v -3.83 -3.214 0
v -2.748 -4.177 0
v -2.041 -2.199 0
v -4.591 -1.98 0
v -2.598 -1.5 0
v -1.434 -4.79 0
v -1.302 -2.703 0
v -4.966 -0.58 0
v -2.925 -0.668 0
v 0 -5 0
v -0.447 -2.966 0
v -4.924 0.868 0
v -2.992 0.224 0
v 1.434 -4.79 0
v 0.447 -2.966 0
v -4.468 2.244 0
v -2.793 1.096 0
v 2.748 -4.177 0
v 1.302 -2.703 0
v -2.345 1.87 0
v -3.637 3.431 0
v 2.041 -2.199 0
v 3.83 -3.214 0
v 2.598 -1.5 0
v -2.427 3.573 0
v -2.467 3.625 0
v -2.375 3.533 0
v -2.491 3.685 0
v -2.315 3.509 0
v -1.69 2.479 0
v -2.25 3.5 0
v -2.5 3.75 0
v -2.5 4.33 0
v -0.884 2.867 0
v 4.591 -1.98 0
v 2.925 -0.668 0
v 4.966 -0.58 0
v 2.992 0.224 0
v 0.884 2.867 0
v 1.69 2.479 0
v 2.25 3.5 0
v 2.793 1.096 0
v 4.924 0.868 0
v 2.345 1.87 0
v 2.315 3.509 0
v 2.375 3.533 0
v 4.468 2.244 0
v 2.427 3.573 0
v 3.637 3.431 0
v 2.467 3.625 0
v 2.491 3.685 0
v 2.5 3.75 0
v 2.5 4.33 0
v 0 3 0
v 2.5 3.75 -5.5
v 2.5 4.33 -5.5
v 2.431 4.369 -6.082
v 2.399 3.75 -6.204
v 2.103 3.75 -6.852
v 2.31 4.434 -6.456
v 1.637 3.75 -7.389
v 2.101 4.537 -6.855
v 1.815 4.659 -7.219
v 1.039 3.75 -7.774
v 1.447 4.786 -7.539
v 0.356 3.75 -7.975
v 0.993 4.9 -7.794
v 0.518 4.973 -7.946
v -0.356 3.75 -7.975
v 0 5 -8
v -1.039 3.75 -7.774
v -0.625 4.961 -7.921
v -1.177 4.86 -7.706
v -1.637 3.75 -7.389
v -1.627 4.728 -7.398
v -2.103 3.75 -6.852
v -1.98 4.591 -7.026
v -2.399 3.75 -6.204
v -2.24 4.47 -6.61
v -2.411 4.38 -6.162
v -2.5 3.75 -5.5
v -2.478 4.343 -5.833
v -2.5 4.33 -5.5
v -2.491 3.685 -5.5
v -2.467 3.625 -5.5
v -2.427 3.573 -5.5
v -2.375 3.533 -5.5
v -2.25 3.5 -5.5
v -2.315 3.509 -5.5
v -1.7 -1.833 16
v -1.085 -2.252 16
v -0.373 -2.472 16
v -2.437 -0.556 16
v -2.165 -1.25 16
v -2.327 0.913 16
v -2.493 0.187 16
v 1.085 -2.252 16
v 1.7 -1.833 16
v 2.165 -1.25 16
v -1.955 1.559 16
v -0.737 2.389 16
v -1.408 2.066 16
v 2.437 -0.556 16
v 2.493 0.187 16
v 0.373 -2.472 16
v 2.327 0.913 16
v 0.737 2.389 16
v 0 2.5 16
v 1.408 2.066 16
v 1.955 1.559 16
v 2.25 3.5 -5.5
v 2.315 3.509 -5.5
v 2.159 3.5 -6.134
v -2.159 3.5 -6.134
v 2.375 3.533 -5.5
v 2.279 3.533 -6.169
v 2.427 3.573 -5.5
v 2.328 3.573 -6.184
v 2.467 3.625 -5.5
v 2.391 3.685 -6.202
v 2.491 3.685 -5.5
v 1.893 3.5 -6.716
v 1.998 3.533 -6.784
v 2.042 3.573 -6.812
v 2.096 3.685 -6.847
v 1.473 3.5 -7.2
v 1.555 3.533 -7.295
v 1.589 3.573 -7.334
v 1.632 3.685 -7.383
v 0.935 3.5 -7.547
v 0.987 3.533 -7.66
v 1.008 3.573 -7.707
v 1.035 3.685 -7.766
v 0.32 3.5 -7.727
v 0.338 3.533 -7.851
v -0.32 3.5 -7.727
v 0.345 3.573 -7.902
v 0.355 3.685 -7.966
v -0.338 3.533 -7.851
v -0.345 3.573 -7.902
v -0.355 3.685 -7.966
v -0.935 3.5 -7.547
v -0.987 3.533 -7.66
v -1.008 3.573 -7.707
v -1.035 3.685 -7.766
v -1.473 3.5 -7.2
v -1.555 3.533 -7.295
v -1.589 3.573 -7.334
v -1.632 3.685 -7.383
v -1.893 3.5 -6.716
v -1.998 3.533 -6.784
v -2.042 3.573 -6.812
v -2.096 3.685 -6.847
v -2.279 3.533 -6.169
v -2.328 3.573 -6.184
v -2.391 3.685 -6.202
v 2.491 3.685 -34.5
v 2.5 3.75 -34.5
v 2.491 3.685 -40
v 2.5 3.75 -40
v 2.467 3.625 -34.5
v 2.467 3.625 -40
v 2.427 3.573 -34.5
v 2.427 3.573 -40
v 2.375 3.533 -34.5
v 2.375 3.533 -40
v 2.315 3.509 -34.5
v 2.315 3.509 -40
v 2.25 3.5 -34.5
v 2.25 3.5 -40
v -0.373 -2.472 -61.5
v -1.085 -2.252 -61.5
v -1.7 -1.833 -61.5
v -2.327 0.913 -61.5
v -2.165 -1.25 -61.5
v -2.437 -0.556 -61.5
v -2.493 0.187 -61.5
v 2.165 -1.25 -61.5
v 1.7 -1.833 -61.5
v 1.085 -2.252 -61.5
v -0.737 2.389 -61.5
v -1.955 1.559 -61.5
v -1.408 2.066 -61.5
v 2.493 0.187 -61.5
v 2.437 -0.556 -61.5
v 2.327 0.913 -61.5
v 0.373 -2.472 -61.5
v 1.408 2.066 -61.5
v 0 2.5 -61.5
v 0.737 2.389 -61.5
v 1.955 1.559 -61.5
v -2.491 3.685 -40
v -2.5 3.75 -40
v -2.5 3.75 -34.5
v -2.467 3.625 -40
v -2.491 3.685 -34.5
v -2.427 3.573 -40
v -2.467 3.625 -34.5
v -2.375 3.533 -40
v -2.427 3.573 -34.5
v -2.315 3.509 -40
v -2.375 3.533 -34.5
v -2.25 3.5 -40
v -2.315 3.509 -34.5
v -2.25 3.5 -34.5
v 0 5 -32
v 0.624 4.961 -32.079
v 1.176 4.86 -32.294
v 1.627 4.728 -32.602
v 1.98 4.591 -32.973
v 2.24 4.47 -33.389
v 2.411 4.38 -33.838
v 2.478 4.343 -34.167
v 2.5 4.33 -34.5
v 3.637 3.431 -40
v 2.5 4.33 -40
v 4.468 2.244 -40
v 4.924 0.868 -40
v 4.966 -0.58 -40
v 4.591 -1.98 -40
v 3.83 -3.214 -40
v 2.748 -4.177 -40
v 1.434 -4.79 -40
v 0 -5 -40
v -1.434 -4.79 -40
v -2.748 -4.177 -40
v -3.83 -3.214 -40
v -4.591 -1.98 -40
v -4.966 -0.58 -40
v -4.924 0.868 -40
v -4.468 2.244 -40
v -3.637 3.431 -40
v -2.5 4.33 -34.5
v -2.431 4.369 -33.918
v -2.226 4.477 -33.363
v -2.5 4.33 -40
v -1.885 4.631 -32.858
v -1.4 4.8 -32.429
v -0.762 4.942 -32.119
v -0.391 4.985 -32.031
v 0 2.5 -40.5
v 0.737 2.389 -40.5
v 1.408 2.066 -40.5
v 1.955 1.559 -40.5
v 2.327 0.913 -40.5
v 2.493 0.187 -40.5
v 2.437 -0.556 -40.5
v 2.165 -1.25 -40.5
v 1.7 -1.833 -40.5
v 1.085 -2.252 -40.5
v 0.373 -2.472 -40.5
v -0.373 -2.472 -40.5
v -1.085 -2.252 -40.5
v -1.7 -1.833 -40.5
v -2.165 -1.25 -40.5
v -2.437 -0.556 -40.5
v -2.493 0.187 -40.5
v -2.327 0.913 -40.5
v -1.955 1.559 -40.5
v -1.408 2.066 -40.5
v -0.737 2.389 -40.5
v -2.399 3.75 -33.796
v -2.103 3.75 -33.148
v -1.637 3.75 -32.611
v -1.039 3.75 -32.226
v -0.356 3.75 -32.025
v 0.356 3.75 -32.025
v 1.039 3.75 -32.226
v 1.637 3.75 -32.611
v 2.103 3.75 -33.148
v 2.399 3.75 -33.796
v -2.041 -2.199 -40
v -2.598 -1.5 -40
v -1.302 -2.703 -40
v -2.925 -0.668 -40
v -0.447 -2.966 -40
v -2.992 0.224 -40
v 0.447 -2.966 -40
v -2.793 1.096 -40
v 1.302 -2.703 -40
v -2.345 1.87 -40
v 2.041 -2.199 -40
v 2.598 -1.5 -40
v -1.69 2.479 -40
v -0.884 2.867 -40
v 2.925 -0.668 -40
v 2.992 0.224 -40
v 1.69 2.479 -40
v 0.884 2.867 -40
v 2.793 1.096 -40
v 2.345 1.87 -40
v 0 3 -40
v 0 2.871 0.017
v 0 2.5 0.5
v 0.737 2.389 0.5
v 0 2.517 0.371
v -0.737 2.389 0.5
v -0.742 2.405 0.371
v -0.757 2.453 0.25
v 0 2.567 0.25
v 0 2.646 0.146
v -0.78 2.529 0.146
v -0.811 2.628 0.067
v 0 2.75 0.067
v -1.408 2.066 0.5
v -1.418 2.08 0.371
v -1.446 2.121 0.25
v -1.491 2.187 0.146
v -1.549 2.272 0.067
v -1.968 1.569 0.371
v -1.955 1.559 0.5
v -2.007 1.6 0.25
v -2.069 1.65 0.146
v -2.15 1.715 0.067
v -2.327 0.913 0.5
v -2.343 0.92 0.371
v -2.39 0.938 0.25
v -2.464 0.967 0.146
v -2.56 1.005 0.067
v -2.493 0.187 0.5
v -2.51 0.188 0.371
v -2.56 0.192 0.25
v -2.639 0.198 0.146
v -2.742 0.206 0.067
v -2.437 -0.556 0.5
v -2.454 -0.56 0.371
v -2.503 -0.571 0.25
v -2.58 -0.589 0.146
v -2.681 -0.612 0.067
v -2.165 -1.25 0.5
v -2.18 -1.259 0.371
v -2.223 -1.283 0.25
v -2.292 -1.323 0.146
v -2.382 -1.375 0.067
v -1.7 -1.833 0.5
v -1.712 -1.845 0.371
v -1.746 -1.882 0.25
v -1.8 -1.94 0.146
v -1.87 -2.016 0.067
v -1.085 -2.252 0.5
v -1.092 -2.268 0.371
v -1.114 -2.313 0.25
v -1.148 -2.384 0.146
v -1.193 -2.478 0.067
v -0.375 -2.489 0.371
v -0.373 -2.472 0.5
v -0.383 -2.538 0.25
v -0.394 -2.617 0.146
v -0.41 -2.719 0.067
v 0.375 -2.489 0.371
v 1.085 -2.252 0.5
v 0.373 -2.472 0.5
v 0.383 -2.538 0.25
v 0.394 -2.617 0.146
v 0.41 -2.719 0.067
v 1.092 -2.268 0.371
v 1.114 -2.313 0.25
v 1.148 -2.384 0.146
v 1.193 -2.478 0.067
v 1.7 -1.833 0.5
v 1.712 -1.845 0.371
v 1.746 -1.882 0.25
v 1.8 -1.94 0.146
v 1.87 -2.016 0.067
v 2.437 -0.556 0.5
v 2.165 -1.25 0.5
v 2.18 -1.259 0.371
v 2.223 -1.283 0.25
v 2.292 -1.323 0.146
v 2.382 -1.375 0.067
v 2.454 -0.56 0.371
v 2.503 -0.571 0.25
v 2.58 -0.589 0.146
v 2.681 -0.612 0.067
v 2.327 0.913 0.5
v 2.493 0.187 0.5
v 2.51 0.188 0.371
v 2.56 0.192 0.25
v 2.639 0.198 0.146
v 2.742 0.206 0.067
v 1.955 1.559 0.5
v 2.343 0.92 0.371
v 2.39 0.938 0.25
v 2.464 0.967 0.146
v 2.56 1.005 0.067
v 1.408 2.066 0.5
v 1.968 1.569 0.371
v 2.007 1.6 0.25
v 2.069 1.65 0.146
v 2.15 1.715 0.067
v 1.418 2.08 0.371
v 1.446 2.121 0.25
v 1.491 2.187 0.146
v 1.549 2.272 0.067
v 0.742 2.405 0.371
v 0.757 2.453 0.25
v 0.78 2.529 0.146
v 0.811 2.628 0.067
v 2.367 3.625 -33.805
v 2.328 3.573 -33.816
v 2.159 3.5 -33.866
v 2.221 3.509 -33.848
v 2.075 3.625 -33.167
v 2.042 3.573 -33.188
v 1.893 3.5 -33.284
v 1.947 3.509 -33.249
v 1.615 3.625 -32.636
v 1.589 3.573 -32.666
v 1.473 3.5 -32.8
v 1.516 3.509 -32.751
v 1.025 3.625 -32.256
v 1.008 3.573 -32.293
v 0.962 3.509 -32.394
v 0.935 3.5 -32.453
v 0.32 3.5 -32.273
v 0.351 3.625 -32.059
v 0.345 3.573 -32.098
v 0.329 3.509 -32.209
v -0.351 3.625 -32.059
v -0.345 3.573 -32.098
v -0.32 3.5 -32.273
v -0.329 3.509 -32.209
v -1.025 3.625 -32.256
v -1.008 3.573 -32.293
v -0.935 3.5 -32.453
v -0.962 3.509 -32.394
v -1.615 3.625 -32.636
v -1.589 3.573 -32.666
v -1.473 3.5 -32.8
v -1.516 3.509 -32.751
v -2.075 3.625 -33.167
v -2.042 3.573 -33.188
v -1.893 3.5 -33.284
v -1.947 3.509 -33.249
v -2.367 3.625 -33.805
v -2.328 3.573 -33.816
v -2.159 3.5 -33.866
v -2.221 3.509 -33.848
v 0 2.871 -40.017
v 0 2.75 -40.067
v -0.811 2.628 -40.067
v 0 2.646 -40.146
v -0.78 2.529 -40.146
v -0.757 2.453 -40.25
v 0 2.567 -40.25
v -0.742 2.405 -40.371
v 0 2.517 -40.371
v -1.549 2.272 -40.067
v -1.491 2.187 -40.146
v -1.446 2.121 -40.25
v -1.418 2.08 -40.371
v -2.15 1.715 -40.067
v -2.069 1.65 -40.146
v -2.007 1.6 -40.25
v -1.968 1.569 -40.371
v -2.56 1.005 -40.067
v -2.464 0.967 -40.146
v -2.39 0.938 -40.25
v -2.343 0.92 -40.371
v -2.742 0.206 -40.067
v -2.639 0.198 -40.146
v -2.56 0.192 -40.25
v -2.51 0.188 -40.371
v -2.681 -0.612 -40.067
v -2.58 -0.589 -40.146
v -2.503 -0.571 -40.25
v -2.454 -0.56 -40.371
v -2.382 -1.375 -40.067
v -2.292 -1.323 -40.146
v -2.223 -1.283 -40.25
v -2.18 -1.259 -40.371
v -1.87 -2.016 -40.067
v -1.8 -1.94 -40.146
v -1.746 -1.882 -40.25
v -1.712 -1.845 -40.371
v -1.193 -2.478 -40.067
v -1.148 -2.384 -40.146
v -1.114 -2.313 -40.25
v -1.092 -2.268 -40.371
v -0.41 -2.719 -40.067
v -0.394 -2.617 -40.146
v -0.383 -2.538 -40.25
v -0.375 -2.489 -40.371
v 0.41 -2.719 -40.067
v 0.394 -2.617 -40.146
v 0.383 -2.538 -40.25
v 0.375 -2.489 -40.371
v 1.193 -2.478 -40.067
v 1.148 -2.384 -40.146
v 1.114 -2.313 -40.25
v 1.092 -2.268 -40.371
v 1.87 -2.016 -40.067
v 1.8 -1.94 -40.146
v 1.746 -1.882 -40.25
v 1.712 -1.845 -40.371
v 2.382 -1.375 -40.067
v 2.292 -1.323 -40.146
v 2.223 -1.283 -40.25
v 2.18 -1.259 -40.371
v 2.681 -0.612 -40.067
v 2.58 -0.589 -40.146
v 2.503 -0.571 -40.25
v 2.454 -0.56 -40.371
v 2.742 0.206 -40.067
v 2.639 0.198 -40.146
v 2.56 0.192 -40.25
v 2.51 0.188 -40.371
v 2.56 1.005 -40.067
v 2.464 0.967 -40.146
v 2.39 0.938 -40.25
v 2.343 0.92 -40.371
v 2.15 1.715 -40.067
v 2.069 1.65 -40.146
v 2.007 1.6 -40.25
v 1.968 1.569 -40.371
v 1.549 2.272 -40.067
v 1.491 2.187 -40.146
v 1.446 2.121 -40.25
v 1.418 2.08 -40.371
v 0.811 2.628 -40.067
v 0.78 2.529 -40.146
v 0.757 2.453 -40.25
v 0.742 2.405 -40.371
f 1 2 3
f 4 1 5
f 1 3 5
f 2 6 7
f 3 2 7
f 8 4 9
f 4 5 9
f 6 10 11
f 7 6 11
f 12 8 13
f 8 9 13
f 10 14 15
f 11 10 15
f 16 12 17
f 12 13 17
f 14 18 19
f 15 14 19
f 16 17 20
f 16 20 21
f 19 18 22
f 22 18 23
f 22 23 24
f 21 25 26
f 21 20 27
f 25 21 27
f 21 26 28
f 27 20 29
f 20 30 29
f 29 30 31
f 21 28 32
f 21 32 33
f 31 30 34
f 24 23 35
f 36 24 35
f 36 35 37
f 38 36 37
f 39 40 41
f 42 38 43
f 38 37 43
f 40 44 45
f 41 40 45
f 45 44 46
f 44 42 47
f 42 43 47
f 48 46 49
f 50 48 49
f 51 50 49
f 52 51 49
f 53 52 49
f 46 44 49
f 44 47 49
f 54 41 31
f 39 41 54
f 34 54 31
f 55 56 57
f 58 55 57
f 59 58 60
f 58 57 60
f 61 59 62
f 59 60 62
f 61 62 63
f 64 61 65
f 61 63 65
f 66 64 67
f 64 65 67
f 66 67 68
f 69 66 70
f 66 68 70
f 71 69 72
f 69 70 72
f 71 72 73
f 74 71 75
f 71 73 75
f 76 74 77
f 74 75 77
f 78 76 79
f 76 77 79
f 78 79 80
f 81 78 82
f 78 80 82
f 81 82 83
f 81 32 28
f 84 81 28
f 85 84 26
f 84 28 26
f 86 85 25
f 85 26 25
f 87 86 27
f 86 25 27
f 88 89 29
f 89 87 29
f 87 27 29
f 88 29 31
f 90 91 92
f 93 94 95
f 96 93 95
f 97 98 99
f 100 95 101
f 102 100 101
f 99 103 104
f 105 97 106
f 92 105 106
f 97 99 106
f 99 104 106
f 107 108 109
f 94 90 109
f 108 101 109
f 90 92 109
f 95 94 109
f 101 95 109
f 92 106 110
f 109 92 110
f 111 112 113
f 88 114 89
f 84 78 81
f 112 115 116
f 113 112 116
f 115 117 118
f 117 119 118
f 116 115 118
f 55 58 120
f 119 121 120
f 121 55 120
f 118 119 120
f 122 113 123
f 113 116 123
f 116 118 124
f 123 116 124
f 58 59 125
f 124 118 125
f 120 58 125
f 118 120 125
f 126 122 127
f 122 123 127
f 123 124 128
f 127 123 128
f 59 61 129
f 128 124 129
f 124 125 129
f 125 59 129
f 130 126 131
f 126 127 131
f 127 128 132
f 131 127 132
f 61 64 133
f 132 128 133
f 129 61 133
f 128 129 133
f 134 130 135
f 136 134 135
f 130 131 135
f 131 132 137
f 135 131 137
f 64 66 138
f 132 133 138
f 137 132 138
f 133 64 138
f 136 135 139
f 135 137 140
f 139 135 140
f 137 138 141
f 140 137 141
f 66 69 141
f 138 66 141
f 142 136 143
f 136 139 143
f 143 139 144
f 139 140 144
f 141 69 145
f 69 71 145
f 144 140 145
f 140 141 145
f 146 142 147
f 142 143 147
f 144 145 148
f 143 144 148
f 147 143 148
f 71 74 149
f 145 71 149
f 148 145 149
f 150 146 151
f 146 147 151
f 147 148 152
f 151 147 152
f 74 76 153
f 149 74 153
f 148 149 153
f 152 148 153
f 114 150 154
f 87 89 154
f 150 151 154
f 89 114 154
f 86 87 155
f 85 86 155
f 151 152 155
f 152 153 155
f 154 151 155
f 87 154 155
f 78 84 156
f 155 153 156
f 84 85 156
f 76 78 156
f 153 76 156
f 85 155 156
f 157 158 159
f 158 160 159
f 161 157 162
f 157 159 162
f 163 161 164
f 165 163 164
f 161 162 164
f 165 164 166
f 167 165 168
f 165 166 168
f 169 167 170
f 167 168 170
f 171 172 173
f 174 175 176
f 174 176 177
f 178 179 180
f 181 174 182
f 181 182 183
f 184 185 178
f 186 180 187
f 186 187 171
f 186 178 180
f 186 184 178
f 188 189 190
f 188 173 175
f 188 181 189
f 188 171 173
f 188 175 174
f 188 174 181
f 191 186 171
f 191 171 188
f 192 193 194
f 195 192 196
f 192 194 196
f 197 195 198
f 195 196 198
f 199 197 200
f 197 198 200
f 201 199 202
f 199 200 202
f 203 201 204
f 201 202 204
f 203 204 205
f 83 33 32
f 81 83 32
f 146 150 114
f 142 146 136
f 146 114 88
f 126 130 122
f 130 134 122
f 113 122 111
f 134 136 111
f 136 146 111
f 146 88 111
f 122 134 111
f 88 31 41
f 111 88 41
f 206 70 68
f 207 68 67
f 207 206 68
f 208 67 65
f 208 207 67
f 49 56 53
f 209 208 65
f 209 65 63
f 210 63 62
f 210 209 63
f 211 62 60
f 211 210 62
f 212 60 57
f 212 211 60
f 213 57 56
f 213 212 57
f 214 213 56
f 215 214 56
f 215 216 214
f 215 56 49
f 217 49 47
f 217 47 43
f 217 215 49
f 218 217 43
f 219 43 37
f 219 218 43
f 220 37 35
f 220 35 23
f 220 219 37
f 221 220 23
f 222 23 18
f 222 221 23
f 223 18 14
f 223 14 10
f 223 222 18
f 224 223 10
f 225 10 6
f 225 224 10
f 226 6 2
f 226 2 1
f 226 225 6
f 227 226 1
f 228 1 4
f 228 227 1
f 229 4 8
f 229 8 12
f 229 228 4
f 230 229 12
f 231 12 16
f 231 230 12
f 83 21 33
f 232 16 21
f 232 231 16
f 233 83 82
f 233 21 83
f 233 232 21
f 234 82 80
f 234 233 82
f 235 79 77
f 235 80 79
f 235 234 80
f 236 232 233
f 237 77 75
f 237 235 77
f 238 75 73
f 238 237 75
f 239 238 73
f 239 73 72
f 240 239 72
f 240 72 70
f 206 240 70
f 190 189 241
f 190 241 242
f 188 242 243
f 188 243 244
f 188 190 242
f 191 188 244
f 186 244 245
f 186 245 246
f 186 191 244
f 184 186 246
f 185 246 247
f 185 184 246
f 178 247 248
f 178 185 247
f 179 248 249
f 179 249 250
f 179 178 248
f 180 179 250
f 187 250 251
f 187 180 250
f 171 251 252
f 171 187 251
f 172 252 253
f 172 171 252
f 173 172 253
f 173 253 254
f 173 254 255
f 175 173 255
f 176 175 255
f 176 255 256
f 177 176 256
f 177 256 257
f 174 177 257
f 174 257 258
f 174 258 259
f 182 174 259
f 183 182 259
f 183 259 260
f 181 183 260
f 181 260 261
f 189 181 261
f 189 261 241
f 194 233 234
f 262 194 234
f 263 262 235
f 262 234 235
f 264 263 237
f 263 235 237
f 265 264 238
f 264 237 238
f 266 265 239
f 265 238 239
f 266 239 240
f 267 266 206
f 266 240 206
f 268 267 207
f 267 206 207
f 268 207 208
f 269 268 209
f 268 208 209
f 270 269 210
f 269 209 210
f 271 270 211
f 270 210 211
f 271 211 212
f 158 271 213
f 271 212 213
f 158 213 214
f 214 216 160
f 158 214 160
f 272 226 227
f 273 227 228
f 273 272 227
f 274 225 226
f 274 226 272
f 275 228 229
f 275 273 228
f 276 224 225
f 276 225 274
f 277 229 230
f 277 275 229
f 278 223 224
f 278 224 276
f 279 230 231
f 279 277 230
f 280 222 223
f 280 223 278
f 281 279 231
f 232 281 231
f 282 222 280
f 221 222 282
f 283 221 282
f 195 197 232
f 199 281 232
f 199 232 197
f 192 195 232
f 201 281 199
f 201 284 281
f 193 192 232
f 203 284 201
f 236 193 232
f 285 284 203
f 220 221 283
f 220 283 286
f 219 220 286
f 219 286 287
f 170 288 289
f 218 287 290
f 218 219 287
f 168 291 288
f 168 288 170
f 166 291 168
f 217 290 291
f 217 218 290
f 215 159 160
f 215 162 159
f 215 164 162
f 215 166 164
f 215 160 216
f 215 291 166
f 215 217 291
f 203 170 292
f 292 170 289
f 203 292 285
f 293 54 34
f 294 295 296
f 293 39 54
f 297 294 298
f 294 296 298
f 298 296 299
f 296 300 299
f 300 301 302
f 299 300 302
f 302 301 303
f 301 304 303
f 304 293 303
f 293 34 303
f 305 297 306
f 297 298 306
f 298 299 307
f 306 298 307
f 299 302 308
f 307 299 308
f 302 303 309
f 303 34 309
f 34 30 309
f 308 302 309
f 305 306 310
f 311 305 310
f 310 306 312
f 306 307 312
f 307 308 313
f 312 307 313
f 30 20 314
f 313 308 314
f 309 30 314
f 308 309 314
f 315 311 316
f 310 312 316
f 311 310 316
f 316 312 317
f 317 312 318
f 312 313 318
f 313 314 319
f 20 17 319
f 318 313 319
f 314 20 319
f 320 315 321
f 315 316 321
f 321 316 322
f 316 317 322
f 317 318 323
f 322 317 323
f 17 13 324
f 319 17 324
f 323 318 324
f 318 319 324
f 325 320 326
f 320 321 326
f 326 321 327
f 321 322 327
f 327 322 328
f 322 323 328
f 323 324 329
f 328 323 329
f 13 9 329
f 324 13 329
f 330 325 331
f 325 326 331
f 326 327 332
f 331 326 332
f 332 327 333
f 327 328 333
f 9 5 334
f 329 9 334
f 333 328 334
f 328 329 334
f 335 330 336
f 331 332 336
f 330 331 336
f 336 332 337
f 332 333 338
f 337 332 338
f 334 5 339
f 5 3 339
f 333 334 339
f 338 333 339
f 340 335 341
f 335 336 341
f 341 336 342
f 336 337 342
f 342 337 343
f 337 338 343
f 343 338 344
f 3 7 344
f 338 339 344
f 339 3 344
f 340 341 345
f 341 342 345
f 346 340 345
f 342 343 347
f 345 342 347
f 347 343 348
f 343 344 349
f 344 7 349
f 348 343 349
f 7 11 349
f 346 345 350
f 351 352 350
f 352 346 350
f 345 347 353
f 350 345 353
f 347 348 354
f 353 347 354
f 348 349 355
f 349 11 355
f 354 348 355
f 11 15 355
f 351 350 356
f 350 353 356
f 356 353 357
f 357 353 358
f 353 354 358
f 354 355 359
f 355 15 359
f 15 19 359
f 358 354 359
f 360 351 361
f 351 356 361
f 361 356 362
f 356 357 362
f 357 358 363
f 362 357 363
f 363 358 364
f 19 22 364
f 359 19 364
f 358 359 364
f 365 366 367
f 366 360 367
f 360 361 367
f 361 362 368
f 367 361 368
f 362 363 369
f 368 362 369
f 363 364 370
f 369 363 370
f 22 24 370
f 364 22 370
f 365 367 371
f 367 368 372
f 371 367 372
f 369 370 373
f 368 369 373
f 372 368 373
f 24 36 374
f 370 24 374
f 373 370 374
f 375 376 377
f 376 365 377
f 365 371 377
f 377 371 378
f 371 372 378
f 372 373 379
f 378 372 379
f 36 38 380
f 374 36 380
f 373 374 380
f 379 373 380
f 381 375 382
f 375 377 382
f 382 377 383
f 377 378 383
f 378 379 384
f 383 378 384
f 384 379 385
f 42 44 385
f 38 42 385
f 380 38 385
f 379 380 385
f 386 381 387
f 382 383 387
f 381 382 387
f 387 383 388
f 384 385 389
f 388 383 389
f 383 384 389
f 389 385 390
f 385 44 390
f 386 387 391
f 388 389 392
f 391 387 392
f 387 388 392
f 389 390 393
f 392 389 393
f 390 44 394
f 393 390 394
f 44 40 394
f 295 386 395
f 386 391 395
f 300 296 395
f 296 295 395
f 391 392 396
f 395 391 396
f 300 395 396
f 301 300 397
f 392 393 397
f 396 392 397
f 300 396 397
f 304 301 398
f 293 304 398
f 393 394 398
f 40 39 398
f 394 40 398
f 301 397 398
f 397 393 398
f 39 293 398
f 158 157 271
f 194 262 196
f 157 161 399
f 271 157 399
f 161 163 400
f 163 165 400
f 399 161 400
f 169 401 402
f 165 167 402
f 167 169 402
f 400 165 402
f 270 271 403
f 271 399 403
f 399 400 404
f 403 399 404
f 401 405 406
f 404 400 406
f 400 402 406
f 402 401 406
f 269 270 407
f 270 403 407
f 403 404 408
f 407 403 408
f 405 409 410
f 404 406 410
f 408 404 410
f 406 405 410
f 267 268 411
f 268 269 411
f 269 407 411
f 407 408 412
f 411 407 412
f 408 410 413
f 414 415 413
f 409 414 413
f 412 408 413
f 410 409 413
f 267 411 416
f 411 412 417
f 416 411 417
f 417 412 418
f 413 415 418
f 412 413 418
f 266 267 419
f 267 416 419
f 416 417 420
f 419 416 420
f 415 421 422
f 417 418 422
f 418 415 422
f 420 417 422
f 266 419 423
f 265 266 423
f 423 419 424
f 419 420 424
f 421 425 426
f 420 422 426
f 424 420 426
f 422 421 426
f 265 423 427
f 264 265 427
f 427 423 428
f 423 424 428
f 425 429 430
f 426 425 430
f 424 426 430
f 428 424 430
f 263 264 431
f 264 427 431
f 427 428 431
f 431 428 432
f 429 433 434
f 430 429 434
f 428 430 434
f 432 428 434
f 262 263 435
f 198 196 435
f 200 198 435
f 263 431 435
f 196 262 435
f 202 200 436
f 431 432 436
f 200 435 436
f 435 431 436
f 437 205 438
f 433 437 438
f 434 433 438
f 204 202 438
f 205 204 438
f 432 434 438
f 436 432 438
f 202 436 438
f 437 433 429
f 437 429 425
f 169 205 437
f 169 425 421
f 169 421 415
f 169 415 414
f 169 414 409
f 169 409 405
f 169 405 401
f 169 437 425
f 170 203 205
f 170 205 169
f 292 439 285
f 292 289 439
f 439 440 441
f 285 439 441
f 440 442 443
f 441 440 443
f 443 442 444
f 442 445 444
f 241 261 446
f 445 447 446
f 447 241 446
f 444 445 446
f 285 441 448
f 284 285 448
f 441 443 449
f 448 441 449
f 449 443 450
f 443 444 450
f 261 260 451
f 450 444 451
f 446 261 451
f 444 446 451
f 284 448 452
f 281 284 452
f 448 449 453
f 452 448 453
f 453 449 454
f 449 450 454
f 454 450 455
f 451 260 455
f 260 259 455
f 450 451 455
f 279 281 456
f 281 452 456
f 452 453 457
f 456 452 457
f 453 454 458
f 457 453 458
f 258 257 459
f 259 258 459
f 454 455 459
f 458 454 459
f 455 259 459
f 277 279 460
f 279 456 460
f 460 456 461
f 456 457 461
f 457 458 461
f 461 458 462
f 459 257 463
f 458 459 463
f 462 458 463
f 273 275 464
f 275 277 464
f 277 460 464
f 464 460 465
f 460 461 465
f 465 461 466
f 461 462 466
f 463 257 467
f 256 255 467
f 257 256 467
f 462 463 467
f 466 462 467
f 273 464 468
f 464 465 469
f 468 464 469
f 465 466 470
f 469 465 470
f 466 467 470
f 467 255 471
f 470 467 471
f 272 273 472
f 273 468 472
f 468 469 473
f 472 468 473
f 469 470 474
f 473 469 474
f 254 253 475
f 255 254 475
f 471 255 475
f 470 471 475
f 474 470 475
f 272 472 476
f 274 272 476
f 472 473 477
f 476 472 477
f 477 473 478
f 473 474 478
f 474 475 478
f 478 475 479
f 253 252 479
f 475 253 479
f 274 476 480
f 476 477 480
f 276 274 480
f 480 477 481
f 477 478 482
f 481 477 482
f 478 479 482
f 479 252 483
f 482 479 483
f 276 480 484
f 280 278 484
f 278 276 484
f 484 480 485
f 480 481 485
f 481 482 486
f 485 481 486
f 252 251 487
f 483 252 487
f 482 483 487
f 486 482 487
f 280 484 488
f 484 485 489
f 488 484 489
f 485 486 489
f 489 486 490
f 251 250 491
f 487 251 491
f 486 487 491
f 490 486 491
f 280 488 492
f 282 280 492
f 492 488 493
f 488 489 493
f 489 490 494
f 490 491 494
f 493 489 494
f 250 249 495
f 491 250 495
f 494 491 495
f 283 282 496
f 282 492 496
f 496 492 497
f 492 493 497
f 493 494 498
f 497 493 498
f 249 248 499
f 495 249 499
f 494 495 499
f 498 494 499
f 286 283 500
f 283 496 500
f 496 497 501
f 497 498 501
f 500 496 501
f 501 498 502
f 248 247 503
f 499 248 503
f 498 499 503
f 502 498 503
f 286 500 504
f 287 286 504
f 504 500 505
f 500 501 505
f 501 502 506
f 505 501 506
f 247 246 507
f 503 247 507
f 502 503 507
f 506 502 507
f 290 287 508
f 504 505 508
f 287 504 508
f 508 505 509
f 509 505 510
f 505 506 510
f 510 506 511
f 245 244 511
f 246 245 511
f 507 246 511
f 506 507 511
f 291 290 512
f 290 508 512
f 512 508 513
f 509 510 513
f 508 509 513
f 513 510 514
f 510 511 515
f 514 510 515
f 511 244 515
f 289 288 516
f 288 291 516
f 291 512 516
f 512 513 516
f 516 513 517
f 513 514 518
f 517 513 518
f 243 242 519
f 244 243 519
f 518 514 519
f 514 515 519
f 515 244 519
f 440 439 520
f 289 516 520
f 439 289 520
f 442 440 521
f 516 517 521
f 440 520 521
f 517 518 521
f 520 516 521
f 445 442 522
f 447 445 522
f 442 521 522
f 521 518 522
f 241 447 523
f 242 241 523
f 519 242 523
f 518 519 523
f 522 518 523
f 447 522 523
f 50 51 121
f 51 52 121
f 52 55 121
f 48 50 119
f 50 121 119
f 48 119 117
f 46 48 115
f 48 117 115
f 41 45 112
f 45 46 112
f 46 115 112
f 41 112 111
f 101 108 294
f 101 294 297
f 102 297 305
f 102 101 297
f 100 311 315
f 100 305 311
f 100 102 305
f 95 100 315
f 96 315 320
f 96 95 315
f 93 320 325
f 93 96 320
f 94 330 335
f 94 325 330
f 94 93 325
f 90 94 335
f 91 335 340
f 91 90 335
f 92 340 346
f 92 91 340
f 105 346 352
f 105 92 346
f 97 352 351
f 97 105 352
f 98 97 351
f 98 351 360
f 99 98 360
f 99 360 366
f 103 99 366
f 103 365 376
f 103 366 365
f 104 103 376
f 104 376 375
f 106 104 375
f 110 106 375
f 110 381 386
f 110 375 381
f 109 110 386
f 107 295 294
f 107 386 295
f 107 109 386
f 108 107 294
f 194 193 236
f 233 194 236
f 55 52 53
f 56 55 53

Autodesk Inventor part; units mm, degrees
ref_plane "YZ Plane" through (0, 0, 0) normal (1, 0, 0) x (0, 1, 0)
ref_plane "XZ Plane" through (0, 0, 0) normal (0, 1, 0) x (-1, 0, 0)
sketch "Sketch1" plane through (0, 0, 0) normal (1, 0, 0) x (0, 1, 0)
  line L0 (0, 0) -> (5, 0)
  line L1 (5, 0) -> (5, -40)
  line L2 (5, -40) -> (0, -40)
  line L3 (0, -40) -> (0, 0)
  line L4 (0, 0) -> (2.5, 0)
  line L5 (2.5, 0) -> (2.5, 16)
  line L6 (2.5, 16) -> (0, 16)
  line L7 (0, 16) -> (0, 0)
  line L8 (0, -40) -> (2.5, -40)
  line L9 (2.5, -40) -> (2.5, -54)
  line L10 (2.5, -54) -> (0, -54)
  line L11 (0, -54) -> (0, -40)
  line L12 (0, -54) -> (2.5, -54)
  line L13 (2.5, -54) -> (2.5, -61.5)
  line L14 (2.5, -61.5) -> (0, -61.5)
  line L15 (0, -61.5) -> (0, -54)
  line L16 (0, 16) -> (2, 16)
  line L17 (0, 14) -> (0, 16)
  line L18 (0, 19.99) -> (0, -68.5807)
  point P0 (2.5, -40)
  dimension "d0" = 5
  dimension "d1" = 40
  dimension "d2" = 2.5
  dimension "d3" = 16
  dimension "d4" = 2.5
  dimension "d5" = 14
  dimension "d6" = 2.5
  dimension "d7" = 7.5
revolve "Revolution1" add sketch "Sketch1" angle 360 about axis through (0, 0, 19.99) along (0, 0, -1)
sketch "Sketch4" plane through (0, 0, 0) normal (0, 0, 1) x (1, 0, 0)
  circle A0 centre (0, 0) radius 5 construction
  line L0 (0, 5) -> (2.5, 5)
  line L1 (2.5, 5) -> (-2.5, 5)
  line L2 (-2.5, 5) -> (-2.5, 3.5)
  line L3 (-2.5, 3.5) -> (2.5, 3.5)
  line L4 (2.5, 3.5) -> (2.5, 5)
  point P0 (0, 0)
  dimension "d25" = 2.5
  dimension "d26" = 5
  dimension "d27" = 1.5
extrude "Extrusion3" cut sketch "Sketch4" against normal blind 5.5
sketch "Sketch5" plane through (0, 0, -40) normal (0, 0, -1) x (-1, 0, 0)
  circle A0 centre (0, 0) radius 5 construction
  line L0 (0, 5) -> (2.5, 5)
  line L1 (-2.5, 4.3301) -> (-2.5, 3.5) projected
  line L2 (2.5, 5) -> (-2.5, 5)
  line L3 (-2.5, 5) -> (-2.5, 3.5)
  line L4 (-2.5, 3.5) -> (2.5, 3.5)
  line L5 (2.5, 3.5) -> (2.5, 5)
  point P0 (0, 0)
  dimension "d30" = 2.5
  dimension "d31" = 5
  dimension "d32" = 1.5
extrude "Extrusion4" cut sketch "Sketch5" against normal blind 5.5
ref_plane "Work Plane1" through (0, 5, -20) normal (0, 1, 0) x (1, 0, 0)
sketch "Sketch6" plane through (0, 5, -20) normal (0, 1, 0) x (1, 0, 0)
  line L0 (2.5, -14.5) -> (-2.5, -14.5) projected
  circle A0 centre (0, -14.5) radius 2.5
  line L1 (-2.5, 14.5) -> (2.5, 14.5) projected
  circle A1 centre (0, 14.5) radius 2.5
  point P0 (0, -20)
extrude "Extrusion5" cut sketch "Sketch6" against normal blind 1.5
fillet "Fillet2" radius 0.5 2 edges at (0, -2.5, 0) (0, -2.5, -40)
fillet "Fillet3" radius 0.25 6 edges at (0, 3.5, -8) (2.5, 3.5, -2.75) (-2.5, 3.5, -2.75) (0, 3.5, -32) (2.5, 3.5, -37.25) (-2.5, 3.5, -37.25)
properties part number "eje2" material "PBT Plastic"
